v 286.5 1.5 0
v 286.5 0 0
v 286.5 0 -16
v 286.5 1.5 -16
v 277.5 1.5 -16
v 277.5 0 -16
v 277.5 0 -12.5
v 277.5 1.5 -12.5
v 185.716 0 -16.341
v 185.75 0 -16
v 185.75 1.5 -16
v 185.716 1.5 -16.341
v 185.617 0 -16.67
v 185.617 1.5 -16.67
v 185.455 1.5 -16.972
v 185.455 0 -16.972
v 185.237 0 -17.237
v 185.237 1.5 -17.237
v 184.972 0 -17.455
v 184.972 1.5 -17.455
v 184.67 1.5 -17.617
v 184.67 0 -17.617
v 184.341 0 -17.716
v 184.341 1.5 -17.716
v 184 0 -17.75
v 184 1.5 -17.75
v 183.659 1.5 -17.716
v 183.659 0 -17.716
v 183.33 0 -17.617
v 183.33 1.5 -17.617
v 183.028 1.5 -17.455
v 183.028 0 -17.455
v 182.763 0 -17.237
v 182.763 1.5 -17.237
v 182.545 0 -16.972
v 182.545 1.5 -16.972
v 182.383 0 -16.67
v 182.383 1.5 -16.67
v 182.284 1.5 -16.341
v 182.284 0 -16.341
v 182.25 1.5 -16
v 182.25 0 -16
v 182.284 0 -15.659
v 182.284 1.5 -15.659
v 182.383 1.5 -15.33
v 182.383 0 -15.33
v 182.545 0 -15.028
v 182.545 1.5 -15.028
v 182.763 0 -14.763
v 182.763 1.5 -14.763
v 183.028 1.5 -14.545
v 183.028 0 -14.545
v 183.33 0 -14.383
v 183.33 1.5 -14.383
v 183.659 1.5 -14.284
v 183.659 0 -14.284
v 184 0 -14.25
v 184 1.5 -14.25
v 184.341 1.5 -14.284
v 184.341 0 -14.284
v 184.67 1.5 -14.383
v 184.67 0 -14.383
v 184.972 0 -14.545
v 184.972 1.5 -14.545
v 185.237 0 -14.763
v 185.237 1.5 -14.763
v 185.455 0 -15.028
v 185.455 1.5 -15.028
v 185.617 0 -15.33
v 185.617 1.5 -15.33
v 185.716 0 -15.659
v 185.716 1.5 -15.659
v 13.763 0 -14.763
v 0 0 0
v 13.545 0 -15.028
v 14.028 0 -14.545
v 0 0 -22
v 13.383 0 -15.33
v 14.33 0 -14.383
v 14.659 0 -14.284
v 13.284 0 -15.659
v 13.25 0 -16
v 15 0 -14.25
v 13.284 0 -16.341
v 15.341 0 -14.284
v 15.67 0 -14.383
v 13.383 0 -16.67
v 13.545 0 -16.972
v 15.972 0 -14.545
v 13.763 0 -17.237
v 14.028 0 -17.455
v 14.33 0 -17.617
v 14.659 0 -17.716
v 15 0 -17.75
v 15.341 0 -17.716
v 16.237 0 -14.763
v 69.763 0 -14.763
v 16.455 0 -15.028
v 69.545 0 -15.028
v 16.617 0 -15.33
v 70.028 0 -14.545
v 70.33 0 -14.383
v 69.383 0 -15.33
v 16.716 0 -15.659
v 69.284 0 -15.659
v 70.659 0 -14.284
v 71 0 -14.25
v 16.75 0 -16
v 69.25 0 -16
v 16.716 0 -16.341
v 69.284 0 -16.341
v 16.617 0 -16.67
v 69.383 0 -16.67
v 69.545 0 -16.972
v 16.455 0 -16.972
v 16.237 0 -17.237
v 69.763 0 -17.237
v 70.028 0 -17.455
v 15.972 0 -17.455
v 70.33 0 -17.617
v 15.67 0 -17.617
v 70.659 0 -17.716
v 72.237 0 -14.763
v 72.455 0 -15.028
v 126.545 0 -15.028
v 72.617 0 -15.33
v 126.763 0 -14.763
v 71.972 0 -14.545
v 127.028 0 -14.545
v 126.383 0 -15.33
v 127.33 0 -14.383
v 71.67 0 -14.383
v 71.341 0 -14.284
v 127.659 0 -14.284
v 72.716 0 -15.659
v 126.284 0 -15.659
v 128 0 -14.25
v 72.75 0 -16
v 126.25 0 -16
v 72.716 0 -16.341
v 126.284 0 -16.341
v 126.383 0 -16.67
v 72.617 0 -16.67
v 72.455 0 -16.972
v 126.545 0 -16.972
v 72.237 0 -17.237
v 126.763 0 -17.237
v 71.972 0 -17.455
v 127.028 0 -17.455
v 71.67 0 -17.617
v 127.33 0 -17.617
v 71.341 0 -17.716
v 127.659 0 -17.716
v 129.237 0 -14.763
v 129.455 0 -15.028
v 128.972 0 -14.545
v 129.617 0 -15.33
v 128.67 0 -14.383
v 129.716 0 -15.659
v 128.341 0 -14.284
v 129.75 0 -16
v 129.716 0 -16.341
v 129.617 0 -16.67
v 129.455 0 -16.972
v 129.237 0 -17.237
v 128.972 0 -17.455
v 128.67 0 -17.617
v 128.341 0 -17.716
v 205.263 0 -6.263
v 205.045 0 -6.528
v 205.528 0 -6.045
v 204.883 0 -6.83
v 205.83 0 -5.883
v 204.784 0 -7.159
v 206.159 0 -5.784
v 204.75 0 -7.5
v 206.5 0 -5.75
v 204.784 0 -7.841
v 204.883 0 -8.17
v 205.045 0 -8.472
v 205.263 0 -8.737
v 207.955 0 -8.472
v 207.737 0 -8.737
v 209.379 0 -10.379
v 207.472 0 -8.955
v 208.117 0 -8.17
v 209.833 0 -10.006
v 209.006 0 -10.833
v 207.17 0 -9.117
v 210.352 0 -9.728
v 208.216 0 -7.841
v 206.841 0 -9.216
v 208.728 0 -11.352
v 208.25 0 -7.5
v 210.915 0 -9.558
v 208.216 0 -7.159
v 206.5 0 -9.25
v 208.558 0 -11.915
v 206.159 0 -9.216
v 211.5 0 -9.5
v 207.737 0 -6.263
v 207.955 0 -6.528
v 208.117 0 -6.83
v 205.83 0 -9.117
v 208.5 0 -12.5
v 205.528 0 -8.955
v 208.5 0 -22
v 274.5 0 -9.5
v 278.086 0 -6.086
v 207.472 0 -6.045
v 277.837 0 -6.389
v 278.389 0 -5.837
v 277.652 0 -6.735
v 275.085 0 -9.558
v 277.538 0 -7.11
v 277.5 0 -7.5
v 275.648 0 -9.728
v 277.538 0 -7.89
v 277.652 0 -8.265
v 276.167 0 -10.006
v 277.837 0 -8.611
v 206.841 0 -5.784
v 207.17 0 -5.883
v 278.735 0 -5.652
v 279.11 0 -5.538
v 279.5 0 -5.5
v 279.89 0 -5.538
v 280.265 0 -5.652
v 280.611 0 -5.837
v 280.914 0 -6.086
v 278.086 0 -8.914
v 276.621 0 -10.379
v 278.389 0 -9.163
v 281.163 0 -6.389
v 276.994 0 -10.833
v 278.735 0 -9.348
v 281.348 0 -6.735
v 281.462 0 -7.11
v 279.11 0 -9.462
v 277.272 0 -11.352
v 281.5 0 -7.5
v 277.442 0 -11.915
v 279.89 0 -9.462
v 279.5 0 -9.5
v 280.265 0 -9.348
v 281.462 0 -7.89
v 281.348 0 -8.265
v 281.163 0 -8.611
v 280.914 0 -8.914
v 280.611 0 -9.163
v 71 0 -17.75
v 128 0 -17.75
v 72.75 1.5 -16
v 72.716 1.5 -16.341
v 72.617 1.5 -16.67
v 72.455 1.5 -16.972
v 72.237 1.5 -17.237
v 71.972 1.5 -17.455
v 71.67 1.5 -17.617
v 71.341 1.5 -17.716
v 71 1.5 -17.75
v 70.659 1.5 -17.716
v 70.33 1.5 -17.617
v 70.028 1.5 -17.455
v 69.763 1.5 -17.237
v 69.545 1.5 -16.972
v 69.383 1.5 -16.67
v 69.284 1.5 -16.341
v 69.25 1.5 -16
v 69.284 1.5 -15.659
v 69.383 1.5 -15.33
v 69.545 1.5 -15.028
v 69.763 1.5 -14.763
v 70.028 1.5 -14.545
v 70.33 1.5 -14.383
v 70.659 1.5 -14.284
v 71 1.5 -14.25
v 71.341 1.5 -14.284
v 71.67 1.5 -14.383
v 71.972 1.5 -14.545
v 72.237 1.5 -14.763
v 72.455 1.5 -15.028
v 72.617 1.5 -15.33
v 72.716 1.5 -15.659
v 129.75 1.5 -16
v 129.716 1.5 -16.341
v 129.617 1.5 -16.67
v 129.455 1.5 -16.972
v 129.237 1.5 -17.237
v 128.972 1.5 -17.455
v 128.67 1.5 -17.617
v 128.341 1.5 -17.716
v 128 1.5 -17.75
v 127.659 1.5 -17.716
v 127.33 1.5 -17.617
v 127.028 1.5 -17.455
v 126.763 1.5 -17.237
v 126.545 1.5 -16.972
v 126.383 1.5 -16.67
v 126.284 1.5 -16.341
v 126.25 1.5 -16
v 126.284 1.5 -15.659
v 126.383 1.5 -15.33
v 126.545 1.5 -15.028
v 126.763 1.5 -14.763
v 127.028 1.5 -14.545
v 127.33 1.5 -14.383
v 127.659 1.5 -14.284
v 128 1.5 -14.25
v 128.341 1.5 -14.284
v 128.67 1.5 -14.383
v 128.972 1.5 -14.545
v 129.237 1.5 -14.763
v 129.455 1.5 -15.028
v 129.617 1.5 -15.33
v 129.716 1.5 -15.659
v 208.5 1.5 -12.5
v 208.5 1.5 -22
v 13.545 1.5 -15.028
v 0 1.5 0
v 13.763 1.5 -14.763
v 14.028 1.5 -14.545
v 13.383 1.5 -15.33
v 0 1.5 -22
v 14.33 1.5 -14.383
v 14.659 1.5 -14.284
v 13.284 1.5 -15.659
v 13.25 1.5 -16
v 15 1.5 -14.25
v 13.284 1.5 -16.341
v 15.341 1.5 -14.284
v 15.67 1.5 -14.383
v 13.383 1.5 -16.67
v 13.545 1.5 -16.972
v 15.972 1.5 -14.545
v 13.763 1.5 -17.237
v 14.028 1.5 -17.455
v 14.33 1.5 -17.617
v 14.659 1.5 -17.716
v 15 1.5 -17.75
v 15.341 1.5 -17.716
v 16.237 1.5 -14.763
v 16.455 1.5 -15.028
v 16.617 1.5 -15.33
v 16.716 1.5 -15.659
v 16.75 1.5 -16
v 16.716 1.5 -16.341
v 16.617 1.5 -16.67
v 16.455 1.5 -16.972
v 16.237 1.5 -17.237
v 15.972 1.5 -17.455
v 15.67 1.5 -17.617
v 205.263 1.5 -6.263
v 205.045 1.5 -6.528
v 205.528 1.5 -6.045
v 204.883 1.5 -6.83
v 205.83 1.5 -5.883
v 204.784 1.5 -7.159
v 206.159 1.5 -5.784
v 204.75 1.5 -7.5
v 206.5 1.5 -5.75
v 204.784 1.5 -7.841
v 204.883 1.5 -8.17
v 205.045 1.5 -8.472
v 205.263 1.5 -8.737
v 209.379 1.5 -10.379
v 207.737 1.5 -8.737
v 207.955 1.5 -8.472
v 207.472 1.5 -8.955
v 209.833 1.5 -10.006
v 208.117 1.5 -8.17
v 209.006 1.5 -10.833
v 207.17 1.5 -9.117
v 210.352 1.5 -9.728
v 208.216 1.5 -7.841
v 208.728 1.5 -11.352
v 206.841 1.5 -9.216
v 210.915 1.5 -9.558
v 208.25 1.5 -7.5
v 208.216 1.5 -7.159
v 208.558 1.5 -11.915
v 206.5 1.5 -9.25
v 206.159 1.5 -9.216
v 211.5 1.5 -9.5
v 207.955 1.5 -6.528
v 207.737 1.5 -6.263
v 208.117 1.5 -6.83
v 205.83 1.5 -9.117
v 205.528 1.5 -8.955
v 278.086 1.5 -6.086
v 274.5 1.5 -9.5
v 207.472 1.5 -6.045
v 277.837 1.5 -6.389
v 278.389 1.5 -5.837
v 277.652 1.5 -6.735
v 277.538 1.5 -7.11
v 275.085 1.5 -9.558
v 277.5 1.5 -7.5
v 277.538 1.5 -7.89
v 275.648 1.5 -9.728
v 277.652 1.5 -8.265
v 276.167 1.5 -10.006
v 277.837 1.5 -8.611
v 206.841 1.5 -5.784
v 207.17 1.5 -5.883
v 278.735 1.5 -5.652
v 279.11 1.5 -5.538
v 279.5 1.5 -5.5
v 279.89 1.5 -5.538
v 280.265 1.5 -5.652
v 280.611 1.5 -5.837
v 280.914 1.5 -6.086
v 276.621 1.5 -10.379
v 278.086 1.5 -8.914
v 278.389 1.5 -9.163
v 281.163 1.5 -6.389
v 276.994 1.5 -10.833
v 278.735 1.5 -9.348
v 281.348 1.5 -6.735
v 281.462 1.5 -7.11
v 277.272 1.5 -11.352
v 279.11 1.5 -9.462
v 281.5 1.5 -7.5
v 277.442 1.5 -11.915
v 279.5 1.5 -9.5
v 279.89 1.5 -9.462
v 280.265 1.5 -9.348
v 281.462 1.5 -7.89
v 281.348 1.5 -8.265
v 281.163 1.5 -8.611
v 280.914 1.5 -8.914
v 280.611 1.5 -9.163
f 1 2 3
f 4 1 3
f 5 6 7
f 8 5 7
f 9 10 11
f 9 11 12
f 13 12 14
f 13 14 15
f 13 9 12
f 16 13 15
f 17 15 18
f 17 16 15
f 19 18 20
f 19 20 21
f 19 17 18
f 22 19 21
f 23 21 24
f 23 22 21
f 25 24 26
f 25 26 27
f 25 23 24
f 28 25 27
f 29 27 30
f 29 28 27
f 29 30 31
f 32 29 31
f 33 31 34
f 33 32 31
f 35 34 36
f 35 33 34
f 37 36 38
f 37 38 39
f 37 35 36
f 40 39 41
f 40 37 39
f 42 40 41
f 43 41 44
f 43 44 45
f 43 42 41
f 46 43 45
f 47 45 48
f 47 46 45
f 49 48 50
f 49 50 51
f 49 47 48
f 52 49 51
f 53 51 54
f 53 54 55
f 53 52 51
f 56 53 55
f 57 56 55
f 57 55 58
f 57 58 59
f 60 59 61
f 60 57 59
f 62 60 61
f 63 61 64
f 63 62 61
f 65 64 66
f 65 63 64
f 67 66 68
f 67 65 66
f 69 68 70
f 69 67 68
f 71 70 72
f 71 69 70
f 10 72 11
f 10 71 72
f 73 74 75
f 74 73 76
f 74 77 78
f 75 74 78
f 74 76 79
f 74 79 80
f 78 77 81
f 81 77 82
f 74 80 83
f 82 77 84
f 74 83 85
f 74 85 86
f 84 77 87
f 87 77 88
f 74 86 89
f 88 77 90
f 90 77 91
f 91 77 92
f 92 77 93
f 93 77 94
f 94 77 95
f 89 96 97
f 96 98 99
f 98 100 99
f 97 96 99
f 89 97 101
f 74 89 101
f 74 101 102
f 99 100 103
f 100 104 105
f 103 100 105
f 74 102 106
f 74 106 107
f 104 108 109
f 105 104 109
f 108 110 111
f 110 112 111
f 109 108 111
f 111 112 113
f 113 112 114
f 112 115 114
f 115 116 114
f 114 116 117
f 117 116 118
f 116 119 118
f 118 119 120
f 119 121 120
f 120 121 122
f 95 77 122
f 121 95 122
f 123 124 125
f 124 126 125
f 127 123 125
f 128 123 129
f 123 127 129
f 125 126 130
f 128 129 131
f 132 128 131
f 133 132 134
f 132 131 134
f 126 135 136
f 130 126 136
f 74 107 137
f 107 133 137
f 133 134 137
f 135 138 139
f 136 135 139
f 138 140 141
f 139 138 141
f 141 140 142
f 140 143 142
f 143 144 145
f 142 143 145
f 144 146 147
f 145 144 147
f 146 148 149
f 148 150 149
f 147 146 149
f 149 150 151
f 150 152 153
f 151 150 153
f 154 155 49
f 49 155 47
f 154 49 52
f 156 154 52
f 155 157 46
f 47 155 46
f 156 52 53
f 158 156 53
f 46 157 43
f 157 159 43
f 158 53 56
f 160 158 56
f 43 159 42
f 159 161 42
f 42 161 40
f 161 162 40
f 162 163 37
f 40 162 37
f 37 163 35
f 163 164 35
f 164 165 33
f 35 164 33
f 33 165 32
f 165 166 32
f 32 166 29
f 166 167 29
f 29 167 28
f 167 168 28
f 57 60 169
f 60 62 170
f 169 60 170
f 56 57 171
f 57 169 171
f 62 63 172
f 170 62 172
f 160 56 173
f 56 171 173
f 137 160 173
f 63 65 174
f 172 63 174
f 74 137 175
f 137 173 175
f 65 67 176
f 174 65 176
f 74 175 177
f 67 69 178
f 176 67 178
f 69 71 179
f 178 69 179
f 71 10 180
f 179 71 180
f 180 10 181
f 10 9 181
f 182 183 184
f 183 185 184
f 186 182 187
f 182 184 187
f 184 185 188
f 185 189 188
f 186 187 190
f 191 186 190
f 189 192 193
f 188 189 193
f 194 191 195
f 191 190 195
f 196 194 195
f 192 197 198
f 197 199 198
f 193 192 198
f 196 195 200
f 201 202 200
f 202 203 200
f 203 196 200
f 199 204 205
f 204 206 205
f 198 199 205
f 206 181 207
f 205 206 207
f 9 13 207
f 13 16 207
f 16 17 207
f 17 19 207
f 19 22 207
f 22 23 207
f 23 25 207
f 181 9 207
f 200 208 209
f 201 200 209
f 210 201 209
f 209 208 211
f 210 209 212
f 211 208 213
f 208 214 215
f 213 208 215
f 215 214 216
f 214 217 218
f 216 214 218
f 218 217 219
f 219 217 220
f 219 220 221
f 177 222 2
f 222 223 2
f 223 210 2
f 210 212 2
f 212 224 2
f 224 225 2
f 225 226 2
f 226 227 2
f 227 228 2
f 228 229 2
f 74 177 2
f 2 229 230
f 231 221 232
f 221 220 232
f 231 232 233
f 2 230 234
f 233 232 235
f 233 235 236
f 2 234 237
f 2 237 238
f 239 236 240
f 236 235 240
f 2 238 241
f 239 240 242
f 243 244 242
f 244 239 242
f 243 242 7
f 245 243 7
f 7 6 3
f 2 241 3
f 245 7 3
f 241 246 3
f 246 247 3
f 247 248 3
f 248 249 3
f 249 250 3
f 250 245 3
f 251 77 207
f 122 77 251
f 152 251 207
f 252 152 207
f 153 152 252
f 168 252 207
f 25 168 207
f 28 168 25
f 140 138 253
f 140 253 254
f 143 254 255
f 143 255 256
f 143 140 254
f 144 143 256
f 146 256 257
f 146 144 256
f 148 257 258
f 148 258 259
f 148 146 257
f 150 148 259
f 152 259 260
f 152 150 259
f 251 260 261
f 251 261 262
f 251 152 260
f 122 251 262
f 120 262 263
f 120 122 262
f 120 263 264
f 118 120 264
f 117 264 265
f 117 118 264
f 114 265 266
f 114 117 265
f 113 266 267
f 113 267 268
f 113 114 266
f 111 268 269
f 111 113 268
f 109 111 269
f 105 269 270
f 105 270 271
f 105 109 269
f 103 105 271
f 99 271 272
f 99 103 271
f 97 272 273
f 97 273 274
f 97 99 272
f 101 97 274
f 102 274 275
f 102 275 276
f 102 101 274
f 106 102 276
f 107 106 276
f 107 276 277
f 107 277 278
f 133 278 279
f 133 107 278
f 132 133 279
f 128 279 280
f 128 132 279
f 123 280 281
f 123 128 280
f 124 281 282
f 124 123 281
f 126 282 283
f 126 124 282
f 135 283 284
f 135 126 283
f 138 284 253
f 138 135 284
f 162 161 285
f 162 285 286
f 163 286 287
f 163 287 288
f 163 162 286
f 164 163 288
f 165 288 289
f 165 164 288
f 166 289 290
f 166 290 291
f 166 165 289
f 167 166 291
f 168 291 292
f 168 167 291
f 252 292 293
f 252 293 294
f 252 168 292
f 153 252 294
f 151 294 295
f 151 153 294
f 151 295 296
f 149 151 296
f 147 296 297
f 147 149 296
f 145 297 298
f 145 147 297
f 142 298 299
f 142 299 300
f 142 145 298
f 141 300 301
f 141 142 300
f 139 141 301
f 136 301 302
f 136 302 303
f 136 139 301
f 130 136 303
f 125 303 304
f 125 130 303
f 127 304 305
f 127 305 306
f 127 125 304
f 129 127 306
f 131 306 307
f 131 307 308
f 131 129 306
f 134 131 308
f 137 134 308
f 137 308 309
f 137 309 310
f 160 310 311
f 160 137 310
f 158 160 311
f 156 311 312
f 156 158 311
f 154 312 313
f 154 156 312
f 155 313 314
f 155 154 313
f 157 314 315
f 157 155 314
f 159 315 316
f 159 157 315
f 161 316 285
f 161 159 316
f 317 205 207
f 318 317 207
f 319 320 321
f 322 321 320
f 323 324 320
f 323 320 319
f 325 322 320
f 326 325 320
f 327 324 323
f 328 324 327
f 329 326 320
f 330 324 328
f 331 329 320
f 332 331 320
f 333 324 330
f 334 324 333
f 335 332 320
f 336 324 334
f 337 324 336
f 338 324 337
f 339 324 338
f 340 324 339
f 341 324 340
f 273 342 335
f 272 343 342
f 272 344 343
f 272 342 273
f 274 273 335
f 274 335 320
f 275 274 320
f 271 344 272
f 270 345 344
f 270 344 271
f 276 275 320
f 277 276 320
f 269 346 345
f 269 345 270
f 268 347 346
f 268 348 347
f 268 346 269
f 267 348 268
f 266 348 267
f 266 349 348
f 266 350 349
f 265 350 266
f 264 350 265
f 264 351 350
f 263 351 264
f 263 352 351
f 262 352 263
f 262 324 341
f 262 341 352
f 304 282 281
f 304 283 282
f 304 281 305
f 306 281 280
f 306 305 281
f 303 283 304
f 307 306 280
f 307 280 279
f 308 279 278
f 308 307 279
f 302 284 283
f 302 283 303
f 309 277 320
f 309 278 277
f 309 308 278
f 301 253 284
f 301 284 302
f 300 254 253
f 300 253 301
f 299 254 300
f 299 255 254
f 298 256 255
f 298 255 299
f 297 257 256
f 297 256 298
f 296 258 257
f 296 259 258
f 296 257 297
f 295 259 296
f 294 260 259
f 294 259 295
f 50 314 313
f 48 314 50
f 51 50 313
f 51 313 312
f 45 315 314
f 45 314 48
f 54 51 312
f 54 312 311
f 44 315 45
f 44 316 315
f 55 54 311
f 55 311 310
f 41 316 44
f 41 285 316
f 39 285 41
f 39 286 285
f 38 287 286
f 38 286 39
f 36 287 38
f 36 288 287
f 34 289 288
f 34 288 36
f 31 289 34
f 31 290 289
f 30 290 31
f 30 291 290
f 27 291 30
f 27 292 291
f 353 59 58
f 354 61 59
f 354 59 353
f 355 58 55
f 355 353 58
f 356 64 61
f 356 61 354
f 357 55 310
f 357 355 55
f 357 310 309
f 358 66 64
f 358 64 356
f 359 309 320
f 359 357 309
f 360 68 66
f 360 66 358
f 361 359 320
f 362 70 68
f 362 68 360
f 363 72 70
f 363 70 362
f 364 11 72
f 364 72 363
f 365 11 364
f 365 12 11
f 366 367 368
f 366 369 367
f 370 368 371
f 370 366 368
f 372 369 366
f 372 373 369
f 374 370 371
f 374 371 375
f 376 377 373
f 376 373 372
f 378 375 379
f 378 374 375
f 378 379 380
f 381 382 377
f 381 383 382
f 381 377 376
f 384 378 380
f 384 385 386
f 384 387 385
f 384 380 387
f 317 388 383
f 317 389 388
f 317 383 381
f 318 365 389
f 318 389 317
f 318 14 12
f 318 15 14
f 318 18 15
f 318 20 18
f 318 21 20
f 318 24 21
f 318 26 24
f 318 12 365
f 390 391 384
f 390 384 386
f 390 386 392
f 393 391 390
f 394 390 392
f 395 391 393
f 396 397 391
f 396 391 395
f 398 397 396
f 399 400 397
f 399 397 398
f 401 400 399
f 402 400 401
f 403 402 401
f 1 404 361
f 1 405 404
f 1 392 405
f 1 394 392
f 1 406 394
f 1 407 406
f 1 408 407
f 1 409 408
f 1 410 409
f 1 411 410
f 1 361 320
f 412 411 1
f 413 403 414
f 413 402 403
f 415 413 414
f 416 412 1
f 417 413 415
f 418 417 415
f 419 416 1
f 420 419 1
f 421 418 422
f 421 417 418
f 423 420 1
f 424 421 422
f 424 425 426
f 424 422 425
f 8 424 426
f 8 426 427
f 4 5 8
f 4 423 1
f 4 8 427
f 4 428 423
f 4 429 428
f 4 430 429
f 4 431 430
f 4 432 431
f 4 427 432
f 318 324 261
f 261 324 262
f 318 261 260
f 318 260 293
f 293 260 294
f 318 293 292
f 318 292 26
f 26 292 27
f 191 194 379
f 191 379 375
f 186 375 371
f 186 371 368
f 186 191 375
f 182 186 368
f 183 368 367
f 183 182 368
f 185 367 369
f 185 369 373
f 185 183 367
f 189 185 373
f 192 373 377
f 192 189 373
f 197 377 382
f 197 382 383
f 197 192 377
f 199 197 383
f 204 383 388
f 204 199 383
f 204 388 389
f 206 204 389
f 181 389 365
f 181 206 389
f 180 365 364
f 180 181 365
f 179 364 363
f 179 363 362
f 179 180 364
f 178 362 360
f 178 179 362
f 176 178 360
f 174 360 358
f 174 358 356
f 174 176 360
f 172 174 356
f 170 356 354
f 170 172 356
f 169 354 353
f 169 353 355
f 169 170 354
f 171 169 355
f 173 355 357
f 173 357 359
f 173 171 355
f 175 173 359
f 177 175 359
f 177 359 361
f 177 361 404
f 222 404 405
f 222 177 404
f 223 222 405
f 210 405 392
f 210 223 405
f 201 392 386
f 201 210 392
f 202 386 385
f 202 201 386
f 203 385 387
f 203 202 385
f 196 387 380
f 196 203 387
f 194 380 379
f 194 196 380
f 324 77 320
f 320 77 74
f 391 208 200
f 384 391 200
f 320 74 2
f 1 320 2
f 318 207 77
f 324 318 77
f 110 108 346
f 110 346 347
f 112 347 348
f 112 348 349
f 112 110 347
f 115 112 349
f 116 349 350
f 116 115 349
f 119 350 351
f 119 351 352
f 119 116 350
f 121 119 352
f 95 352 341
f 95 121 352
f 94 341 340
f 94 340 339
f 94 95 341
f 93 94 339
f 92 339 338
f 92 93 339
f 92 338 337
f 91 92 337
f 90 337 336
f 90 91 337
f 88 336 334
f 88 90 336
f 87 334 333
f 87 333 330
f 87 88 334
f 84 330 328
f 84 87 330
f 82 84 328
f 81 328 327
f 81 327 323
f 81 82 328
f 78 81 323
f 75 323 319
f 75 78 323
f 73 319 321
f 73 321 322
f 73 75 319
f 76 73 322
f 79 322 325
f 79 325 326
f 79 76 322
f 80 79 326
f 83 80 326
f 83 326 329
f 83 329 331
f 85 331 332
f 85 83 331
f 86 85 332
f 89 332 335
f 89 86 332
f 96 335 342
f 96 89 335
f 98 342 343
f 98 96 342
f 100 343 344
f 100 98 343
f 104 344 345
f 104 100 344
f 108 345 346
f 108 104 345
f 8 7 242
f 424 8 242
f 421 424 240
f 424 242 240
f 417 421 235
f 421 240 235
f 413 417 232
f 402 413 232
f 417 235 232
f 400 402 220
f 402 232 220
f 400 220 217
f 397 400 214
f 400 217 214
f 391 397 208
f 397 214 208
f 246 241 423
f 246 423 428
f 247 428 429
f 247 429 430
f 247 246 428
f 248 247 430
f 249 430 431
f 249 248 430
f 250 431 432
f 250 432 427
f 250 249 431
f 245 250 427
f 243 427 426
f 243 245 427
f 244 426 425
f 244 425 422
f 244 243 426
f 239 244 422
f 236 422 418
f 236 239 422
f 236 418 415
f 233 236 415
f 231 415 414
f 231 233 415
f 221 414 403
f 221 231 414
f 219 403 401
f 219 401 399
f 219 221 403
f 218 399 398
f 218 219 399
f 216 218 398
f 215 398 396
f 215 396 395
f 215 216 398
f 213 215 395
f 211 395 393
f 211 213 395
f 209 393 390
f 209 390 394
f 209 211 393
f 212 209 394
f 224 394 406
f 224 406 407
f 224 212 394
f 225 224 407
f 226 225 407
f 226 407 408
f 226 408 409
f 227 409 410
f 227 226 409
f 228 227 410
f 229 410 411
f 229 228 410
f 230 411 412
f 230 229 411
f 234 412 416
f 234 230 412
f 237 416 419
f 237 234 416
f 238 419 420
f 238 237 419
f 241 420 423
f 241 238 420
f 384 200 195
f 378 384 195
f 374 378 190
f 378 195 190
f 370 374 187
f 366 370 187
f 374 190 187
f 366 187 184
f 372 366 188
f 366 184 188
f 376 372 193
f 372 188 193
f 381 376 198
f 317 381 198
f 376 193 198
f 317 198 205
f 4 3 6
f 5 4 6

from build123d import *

# Parameters (mm, degrees)
SKETCH_1_R      = 1.75
SKETCH_1_R_2    = 2
EXTRUDE_1_DEPTH = 1.5


with BuildPart() as part:
    # Эскиз1 → Бобышка-Вытянуть1 (new body)
    with BuildSketch(Plane(origin=(0, 0, 0), x_dir=(1, 0, 0), z_dir=(0, 1, 0))):
        with BuildLine():
            Line((208.5, 12.5), (208.5, 22))
            Line((208.5, 22), (0, 22))
            Line((0, 22), (0, 0))
            Line((0, 0), (286.5, 0))
            Line((286.5, 0), (286.5, 16))
            Line((286.5, 16), (277.5, 16))
            Line((277.5, 16), (277.5, 12.5))
            ThreePointArc((277.5, 12.5), (276.621320344, 10.378679656), (274.5, 9.5))
            Line((274.5, 9.5), (211.5, 9.5))
            ThreePointArc((211.5, 9.5), (209.378679656, 10.378679656), (208.5, 12.5))
        make_face()
        with Locations((206.5, 7.5)):
            Circle(SKETCH_1_R, mode=Mode.SUBTRACT)
        with Locations((279.5, 7.5)):
            Circle(SKETCH_1_R_2, mode=Mode.SUBTRACT)
        with Locations((15, 16)):
            Circle(SKETCH_1_R, mode=Mode.SUBTRACT)
        with Locations((71, 16)):
            Circle(SKETCH_1_R, mode=Mode.SUBTRACT)
        with Locations((128, 16)):
            Circle(SKETCH_1_R, mode=Mode.SUBTRACT)
        with Locations((184, 16)):
            Circle(SKETCH_1_R, mode=Mode.SUBTRACT)
    extrude(amount=EXTRUDE_1_DEPTH)


solid = part.part
